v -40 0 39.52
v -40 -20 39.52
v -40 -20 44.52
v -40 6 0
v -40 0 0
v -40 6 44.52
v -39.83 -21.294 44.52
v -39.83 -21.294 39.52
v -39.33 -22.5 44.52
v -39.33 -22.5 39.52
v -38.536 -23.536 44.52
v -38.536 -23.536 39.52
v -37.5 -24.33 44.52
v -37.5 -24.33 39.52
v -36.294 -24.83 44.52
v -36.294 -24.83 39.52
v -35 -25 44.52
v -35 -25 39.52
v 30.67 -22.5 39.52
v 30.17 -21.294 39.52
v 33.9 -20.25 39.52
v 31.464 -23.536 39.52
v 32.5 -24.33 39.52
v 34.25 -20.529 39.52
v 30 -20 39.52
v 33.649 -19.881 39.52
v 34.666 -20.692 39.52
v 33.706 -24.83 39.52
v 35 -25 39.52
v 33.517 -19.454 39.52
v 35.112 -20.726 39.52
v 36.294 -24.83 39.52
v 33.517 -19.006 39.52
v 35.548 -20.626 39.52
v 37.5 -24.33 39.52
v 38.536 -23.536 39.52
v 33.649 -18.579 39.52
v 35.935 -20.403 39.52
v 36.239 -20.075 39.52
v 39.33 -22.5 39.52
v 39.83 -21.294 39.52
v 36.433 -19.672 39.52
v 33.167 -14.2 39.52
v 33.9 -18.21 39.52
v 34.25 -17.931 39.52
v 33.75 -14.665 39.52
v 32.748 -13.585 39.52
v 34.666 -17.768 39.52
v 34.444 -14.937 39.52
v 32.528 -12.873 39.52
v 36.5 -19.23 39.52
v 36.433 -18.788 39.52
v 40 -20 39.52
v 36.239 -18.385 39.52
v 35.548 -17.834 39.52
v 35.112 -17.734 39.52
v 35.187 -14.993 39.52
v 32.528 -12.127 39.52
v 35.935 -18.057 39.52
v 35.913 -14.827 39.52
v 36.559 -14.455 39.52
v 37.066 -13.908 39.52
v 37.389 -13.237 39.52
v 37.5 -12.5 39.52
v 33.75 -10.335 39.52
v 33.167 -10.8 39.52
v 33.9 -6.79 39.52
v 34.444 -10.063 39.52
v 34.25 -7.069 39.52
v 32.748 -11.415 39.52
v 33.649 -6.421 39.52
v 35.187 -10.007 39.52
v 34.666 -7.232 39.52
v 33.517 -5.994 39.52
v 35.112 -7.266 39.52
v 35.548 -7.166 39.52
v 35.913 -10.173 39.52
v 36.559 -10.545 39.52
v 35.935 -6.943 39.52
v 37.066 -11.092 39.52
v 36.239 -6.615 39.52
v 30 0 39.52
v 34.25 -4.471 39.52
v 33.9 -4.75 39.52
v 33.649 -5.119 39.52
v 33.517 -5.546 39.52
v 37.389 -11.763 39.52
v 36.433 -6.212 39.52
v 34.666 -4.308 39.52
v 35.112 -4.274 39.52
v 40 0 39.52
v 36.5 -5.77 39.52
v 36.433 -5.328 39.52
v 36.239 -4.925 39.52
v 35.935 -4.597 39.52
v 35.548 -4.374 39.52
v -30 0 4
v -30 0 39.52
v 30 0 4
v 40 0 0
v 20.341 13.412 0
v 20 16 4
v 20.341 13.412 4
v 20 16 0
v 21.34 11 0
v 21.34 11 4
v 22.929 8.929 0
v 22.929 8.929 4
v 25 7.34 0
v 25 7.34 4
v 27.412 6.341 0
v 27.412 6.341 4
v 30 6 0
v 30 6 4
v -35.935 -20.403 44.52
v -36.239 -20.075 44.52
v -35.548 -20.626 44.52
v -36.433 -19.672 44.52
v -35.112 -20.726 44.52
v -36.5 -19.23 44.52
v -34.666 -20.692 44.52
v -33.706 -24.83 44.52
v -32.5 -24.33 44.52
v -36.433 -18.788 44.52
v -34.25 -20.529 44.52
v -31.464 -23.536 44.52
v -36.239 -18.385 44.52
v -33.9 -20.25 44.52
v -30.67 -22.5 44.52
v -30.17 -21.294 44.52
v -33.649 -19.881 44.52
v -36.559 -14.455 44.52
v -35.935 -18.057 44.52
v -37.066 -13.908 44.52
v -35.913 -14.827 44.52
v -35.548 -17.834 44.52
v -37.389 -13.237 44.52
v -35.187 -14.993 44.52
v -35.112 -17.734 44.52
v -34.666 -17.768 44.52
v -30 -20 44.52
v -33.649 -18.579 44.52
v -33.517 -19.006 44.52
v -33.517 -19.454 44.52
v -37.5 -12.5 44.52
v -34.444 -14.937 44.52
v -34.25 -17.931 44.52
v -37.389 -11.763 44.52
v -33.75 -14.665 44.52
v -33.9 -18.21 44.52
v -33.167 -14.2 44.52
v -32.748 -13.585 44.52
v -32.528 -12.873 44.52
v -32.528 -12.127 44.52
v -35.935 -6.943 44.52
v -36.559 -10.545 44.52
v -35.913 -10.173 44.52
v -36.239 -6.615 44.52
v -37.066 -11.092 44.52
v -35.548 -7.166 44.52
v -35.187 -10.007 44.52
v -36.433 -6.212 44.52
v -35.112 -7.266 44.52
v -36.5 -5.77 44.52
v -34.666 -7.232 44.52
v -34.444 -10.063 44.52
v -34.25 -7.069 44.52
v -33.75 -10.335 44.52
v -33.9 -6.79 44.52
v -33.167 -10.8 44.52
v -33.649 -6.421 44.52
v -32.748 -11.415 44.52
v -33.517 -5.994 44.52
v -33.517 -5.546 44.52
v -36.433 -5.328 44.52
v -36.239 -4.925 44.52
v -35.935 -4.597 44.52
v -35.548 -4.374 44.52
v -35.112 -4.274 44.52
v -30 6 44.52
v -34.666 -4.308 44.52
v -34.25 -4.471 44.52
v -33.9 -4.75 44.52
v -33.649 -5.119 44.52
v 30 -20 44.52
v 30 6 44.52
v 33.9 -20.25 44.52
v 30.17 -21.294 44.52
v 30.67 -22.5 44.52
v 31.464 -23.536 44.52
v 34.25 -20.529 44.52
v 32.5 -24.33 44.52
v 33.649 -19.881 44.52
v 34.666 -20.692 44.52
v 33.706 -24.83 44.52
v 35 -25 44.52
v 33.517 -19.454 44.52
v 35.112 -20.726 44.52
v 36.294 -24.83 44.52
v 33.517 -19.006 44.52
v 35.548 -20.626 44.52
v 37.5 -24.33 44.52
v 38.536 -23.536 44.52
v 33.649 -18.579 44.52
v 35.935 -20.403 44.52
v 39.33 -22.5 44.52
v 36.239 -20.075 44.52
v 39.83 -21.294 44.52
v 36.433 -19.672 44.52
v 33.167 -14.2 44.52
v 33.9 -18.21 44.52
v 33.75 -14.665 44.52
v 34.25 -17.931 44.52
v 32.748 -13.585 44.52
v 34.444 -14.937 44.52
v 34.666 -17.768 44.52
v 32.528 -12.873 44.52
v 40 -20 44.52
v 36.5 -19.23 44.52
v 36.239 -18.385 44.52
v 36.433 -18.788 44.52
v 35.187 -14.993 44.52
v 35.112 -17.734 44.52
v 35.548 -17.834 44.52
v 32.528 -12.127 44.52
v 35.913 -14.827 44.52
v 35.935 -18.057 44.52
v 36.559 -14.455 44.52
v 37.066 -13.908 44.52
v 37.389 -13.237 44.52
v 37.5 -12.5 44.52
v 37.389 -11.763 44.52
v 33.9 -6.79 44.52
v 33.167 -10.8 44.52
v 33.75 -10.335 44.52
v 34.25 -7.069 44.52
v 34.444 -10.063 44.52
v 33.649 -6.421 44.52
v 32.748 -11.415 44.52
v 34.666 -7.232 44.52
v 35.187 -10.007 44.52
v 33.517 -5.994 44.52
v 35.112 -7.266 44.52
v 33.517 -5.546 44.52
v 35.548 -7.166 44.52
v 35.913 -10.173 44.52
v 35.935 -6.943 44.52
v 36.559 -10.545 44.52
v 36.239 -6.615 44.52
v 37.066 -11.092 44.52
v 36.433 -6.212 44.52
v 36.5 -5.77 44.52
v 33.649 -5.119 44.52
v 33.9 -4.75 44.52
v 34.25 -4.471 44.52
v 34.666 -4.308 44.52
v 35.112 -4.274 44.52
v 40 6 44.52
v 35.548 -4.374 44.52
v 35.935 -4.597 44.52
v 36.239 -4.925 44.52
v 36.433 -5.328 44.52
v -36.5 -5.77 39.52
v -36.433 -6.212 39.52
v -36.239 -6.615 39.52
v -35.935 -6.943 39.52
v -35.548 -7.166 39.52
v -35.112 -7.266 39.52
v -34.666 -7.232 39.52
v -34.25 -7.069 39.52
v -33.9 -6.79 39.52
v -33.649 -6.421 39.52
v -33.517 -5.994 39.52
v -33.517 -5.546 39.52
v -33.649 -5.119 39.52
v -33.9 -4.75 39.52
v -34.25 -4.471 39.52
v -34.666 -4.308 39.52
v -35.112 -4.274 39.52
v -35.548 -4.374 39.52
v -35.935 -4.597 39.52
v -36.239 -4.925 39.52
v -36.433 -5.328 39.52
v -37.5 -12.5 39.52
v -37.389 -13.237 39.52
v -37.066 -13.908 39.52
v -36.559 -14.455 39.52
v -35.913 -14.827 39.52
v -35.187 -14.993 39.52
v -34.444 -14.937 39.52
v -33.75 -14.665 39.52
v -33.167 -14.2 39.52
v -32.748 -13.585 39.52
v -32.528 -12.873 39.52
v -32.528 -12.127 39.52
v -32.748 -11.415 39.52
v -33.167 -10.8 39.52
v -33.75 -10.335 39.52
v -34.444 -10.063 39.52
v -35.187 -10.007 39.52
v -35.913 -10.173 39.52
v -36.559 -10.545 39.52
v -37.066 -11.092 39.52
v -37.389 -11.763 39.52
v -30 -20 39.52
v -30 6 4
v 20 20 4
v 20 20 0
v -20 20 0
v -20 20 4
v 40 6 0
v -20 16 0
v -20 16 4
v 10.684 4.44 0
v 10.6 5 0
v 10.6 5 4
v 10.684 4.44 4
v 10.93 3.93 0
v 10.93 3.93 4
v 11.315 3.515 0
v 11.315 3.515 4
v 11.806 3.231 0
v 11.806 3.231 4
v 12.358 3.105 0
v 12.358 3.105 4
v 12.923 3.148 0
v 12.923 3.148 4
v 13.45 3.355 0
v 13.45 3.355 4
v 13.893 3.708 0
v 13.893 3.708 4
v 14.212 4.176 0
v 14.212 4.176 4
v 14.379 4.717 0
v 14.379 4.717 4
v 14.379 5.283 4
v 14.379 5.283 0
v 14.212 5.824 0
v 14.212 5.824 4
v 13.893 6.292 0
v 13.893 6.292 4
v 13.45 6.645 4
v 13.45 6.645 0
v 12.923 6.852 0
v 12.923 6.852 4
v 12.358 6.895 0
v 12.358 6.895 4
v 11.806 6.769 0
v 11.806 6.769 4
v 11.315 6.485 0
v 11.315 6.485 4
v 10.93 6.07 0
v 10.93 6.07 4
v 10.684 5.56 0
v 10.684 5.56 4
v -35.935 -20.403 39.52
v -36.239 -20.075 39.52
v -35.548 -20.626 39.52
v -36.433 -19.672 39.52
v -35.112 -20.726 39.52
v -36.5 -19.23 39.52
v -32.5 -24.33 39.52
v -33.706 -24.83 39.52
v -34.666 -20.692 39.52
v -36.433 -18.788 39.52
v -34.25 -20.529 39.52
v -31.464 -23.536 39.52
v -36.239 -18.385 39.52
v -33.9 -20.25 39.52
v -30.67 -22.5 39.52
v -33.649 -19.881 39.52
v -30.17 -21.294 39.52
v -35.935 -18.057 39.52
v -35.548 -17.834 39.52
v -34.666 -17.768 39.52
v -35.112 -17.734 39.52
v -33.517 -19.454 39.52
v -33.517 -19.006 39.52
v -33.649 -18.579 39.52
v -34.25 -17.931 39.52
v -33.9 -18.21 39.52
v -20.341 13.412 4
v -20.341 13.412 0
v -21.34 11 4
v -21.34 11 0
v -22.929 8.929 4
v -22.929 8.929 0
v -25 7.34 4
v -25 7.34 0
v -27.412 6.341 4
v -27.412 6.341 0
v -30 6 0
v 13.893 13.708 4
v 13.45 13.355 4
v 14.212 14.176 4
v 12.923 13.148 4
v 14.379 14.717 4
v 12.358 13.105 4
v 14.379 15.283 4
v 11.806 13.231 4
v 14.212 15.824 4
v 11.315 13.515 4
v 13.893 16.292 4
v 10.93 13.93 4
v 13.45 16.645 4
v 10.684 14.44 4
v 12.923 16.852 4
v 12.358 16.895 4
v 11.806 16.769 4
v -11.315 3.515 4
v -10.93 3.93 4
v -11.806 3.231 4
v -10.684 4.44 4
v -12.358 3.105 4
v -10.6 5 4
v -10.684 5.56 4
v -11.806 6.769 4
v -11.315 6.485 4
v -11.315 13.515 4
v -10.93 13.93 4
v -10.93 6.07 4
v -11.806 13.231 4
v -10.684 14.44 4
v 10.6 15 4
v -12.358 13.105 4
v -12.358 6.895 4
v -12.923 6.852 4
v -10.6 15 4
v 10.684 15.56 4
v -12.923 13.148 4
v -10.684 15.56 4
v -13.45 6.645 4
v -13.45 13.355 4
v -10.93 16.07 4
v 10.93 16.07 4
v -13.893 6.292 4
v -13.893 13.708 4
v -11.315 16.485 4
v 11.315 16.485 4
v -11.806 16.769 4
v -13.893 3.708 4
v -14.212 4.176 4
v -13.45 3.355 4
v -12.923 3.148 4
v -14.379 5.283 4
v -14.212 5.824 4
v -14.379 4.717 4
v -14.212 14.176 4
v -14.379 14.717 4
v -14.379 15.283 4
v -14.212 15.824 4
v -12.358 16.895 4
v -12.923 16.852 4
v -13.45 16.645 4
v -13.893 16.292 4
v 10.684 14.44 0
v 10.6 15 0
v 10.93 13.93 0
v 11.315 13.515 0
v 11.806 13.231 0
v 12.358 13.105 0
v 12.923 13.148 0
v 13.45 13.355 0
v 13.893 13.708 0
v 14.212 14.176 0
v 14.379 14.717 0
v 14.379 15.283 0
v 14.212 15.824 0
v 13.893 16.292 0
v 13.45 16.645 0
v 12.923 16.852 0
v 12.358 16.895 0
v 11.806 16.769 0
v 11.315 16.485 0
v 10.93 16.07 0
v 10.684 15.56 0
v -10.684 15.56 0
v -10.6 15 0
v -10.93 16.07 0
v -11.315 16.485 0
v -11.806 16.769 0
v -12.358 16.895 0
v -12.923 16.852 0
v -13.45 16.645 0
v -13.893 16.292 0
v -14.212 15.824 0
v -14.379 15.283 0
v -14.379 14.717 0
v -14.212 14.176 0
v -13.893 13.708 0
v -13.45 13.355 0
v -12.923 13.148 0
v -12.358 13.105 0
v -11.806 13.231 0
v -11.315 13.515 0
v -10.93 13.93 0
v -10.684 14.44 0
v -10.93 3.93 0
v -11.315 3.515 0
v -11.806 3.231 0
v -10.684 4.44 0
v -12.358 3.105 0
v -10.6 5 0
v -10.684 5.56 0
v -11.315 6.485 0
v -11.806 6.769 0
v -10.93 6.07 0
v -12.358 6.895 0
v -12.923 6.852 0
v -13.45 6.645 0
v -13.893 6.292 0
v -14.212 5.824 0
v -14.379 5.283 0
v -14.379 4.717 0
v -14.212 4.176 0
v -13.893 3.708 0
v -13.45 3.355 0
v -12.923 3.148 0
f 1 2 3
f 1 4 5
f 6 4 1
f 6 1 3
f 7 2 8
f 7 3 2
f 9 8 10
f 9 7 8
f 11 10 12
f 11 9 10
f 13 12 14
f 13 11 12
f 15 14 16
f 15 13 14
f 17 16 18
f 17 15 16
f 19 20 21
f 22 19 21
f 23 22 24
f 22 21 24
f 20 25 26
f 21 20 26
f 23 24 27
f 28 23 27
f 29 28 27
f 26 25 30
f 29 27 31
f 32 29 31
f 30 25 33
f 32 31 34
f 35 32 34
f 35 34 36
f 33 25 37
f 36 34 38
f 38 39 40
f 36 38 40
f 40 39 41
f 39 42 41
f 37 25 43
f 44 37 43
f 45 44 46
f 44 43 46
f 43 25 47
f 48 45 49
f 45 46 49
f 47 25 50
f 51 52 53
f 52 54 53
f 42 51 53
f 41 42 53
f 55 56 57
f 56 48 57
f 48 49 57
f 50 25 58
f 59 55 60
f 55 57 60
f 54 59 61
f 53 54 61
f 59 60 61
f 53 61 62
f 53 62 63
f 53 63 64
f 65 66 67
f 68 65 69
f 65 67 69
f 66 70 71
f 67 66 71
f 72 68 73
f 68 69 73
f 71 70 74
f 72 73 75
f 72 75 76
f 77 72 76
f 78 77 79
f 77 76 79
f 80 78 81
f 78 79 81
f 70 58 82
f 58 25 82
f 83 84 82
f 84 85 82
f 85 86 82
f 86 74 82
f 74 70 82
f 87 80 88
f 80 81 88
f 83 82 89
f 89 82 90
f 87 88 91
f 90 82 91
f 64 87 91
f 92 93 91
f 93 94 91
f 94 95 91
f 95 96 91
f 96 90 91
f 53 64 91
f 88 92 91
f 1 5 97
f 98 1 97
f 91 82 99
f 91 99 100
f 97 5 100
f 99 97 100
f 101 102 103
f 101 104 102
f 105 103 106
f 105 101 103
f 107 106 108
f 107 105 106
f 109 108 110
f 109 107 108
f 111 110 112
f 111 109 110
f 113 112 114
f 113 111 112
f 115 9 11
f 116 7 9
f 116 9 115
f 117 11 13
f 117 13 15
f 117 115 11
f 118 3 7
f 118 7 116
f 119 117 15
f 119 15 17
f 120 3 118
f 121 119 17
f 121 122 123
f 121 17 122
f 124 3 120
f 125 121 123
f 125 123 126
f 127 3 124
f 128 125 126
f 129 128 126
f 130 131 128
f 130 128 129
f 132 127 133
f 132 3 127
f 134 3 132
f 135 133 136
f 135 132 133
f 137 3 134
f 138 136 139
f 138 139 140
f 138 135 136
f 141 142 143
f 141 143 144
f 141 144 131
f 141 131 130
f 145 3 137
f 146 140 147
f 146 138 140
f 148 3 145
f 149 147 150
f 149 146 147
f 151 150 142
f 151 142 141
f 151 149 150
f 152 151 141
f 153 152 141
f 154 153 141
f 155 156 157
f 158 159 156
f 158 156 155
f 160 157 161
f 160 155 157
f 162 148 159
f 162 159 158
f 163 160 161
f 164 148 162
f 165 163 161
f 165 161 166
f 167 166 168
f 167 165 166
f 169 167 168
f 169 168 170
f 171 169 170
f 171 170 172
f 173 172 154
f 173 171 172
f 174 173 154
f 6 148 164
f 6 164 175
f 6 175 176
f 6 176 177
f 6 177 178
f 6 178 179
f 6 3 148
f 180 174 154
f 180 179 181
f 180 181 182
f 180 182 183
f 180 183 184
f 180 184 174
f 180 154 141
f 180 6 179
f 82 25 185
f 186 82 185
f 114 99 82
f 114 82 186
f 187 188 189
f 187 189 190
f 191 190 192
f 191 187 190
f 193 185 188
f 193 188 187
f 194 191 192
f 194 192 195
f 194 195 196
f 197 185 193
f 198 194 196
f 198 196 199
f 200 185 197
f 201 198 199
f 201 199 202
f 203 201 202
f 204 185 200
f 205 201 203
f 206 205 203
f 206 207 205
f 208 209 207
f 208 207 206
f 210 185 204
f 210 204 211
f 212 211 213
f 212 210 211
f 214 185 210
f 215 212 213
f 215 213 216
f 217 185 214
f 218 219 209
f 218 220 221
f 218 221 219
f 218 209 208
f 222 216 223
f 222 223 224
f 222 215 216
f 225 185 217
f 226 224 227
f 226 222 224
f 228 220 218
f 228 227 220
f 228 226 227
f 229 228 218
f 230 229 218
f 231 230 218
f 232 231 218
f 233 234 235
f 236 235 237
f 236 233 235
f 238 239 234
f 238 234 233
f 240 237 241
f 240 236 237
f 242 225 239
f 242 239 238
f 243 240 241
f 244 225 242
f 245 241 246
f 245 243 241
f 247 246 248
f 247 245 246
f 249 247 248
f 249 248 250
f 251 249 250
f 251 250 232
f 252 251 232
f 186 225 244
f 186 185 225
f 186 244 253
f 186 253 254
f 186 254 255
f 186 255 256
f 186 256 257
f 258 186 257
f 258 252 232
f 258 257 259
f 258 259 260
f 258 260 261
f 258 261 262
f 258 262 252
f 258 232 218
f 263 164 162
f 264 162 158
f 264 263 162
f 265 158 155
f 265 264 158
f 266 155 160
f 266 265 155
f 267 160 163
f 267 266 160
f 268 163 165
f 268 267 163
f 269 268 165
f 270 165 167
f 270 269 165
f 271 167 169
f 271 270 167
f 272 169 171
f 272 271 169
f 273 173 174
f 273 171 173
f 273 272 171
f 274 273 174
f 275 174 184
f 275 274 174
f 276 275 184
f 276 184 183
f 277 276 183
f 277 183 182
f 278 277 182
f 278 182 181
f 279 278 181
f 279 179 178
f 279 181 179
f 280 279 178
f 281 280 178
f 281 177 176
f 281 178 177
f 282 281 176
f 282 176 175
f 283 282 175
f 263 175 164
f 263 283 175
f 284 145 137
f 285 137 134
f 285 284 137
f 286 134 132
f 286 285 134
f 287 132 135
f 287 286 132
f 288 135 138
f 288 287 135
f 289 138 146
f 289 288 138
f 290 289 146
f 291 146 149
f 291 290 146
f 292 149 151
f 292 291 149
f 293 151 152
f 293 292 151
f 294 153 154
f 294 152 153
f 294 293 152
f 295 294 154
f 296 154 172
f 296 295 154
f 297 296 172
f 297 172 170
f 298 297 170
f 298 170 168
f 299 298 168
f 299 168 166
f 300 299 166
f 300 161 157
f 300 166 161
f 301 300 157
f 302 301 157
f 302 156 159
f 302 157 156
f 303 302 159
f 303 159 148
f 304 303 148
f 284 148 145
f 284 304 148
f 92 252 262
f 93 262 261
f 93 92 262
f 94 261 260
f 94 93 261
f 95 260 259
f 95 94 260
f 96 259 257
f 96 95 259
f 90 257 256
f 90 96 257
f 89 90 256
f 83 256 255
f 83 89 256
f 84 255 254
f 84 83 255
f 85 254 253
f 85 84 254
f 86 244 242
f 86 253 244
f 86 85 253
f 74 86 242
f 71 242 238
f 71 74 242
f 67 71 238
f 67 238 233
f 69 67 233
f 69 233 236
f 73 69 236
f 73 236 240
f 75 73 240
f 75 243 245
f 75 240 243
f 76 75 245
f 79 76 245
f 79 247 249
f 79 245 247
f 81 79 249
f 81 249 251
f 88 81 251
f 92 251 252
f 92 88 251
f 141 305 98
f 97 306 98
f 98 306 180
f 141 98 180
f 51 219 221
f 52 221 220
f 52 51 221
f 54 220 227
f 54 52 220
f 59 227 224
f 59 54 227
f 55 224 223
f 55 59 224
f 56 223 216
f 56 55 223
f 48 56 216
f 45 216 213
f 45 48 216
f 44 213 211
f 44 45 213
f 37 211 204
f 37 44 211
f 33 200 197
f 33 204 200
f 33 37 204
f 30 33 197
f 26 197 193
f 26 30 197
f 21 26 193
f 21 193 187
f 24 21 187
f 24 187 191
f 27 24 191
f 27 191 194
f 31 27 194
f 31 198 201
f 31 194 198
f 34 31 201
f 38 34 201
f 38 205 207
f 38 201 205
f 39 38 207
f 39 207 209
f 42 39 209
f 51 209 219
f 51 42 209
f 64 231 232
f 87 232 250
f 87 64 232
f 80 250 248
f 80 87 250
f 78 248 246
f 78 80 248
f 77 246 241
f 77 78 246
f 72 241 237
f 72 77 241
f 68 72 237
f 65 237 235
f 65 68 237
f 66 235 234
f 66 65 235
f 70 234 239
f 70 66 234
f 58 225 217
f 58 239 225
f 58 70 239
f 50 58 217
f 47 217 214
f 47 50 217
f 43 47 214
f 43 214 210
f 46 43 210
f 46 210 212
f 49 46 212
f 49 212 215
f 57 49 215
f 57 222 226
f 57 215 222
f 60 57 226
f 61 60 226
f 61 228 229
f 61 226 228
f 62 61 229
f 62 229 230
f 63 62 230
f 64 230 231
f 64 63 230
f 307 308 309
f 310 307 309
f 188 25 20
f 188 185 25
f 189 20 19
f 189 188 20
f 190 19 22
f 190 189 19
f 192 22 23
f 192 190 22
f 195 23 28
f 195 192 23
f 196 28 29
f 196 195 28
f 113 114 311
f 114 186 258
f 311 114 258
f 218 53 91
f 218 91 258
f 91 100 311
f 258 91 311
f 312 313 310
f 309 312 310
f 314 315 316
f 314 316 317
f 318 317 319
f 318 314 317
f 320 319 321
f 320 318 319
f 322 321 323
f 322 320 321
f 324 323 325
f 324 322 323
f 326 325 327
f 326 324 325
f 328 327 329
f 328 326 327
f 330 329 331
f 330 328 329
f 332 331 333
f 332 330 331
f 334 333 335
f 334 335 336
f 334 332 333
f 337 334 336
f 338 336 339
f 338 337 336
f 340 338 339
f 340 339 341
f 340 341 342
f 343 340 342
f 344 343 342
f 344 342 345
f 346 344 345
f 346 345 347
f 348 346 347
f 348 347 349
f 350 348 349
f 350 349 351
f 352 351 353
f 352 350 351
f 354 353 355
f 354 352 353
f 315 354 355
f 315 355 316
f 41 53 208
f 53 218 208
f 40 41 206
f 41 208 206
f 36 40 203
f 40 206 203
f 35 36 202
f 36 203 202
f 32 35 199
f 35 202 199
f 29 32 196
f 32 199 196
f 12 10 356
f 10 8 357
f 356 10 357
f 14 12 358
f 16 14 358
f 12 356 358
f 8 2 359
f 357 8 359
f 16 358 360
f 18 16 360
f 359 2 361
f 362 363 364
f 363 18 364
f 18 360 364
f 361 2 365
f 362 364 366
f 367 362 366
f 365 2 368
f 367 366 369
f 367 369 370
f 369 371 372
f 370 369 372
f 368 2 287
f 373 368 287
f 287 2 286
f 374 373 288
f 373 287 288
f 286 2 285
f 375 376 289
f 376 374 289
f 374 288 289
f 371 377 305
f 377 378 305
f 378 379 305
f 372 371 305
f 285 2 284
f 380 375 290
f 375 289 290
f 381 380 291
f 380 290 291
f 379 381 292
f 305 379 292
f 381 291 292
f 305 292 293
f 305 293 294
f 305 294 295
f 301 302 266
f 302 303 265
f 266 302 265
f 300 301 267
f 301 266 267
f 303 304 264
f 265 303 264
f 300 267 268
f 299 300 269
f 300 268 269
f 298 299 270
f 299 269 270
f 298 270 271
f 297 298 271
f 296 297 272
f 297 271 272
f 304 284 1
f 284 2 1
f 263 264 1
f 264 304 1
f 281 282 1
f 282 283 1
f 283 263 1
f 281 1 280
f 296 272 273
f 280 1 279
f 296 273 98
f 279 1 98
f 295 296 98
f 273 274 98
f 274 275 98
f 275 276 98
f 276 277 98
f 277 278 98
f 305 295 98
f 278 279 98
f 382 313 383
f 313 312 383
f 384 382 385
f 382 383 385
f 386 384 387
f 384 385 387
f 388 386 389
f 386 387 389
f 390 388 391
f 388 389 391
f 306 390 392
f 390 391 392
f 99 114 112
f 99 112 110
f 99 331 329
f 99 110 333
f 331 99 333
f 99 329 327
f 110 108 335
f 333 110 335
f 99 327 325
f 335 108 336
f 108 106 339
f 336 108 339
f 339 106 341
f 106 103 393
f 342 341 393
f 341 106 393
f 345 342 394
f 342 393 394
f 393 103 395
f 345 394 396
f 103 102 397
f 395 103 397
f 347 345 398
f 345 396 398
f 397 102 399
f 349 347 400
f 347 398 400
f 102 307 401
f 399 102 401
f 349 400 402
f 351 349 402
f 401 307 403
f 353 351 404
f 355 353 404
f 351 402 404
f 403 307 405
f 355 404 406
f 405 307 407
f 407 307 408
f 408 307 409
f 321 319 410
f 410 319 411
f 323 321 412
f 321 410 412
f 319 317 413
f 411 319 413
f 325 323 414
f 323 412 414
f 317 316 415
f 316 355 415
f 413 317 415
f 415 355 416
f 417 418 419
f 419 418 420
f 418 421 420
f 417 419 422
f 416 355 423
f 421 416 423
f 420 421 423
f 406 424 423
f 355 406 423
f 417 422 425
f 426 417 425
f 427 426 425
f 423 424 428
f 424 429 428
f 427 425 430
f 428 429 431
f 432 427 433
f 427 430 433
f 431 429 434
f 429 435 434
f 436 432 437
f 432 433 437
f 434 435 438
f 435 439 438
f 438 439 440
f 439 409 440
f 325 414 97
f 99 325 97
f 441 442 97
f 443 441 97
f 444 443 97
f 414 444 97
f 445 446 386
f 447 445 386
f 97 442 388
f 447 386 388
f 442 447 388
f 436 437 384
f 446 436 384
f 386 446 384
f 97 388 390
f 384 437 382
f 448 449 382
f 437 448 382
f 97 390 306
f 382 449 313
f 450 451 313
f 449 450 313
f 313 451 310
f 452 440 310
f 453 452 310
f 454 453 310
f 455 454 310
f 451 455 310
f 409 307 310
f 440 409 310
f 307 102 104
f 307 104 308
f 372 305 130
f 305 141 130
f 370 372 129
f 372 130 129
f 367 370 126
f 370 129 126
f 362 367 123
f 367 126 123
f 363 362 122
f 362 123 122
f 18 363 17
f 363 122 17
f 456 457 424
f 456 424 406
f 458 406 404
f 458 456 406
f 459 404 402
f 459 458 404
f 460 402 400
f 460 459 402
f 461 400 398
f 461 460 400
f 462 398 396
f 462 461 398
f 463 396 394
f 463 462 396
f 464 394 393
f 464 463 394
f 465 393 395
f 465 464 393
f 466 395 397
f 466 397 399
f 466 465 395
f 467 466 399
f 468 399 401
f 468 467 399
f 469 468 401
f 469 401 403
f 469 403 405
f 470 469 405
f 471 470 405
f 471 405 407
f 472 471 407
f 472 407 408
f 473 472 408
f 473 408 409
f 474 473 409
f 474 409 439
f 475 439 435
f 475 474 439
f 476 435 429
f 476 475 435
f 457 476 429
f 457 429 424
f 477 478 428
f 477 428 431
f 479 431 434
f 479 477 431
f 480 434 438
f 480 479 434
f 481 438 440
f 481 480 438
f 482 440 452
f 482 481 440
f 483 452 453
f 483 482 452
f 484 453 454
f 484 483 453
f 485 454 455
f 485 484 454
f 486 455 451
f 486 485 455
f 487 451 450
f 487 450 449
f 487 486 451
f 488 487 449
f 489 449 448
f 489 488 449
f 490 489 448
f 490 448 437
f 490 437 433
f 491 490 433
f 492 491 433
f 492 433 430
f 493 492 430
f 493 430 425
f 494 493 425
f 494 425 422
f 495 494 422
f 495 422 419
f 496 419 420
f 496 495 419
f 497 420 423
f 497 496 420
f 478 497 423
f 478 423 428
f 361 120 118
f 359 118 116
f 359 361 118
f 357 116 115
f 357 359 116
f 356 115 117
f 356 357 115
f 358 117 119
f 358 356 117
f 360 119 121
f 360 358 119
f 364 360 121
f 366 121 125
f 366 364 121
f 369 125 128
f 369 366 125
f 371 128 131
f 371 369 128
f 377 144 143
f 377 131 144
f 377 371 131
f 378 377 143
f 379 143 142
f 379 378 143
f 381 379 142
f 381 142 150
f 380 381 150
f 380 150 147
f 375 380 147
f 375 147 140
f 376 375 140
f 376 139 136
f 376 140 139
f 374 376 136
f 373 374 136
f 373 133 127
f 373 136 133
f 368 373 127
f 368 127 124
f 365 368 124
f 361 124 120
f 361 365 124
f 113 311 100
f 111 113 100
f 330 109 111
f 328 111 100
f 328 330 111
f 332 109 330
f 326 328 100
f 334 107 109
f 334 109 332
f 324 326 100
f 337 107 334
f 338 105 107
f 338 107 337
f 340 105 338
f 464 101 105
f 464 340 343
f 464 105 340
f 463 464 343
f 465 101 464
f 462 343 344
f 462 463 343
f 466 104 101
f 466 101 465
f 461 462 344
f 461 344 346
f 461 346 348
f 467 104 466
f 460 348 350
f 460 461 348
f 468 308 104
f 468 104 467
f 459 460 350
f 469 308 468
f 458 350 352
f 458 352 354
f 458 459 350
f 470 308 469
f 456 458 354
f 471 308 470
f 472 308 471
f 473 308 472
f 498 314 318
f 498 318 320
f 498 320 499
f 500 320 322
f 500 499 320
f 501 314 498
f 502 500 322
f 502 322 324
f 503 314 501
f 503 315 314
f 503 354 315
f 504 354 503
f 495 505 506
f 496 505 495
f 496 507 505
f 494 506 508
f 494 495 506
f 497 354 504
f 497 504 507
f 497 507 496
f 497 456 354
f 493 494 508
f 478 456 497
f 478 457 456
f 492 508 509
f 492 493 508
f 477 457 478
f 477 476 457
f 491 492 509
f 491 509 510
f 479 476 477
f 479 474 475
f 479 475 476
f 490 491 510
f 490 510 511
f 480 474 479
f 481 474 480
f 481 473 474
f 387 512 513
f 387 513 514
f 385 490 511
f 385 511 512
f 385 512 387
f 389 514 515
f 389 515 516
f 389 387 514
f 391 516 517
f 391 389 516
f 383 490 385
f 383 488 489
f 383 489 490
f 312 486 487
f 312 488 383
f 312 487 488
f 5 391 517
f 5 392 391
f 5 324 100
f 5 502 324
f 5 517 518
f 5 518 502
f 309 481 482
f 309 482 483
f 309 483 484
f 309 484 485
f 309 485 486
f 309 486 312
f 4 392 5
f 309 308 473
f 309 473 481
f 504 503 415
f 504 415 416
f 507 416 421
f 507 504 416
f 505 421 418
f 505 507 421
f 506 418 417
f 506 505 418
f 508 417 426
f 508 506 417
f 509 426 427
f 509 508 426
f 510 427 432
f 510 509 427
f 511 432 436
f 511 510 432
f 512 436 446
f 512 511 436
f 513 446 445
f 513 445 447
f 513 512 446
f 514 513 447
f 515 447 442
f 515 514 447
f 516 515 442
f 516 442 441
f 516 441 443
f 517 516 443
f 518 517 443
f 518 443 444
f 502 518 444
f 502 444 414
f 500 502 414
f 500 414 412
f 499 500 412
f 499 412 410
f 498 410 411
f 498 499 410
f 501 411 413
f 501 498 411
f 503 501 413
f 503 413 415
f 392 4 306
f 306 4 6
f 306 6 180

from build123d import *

# Parameters (mm, degrees)
SKETCH1_W           = 40
SKETCH1_H           = 20
SKETCH1_R           = 1.9
MAIN_MOUNTING_DEPTH = 4
SKETCH2_W           = 20
SKETCH2_H           = 20
EXTENTION_DEPTH     = 4
SKETCH3_W           = 10
SKETCH3_H           = 6
BOSS_EXTRUDE3_DEPTH = 40.52
SKETCH4_W           = 10
SKETCH4_H           = 5
BOSS_EXTRUDE4_DEPTH = 25
SKETCH5_R           = 1.5
SKETCH5_R_2         = 2.5
CUT_EXTRUDE1_DEPTH  = 62.537227757
SKETCH7_W           = 20
SKETCH7_H           = 14
CUT_EXTRUDE2_DEPTH  = 63.184165187
FILLET1_R           = 10
FILLET2_R           = 5


with BuildPart() as part:
    # Sketch1 → main mounting (new body)
    with BuildSketch(Plane.XY):
        with Locations((0, 10)):
            Rectangle(SKETCH1_W, SKETCH1_H)
        with Locations((-12.5, 15)):
            Circle(SKETCH1_R, mode=Mode.SUBTRACT)
        with Locations((-12.5, 5)):
            Circle(SKETCH1_R, mode=Mode.SUBTRACT)
        with Locations(Location((12.5, 5, 0), (0, 0, 180))):
            Circle(SKETCH1_R, mode=Mode.SUBTRACT)
        with Locations(Location((12.5, 15, 0), (0, 0, 180))):
            Circle(SKETCH1_R, mode=Mode.SUBTRACT)
    extrude(amount=MAIN_MOUNTING_DEPTH)

    # Sketch2 → extention (add)
    with BuildSketch(Plane(origin=(0, 0, 0), x_dir=(-1, 0, 0), z_dir=(0, 0, -1))):
        with Locations((30, 10)):
            Rectangle(SKETCH2_W, SKETCH2_H)
        with Locations((-30, 10)):
            Rectangle(SKETCH2_W, SKETCH2_H)
    extrude(amount=-EXTENTION_DEPTH)

    # Sketch3 → Boss-Extrude3 (add)
    with BuildSketch(Plane.XY.offset(4)):
        with Locations((-35, 3)):
            Rectangle(SKETCH3_W, SKETCH3_H)
        with Locations((35, 3)):
            Rectangle(SKETCH3_W, SKETCH3_H)
    extrude(amount=BOSS_EXTRUDE3_DEPTH)

    # Sketch4 → Boss-Extrude4 (add)
    with BuildSketch(Plane.XZ):
        with Locations((-35, 42.02)):
            Rectangle(SKETCH4_W, SKETCH4_H)
        with Locations((35, 42.02)):
            Rectangle(SKETCH4_W, SKETCH4_H)
    extrude(amount=BOSS_EXTRUDE4_DEPTH)

    # Sketch5 → Cut-Extrude1 (cut, through all)
    with BuildSketch(Plane(origin=(0, 0, 39.52), x_dir=(-1, 0, 0), z_dir=(0, 0, 1))):
        with Locations((35, 19.23)):
            Circle(SKETCH5_R)
        with Locations((35, 5.77)):
            Circle(SKETCH5_R)
        with Locations(Location((-35, 12.5, 0), (0, 0, 180))):
            Circle(SKETCH5_R_2)
        with Locations((35, 12.5)):
            Circle(SKETCH5_R_2)
        with Locations(Location((-35, 5.77, 0), (0, 0, 180))):
            Circle(SKETCH5_R)
        with Locations(Location((-35, 19.23, 0), (0, 0, 180))):
            Circle(SKETCH5_R)
    extrude(amount=CUT_EXTRUDE1_DEPTH, mode=Mode.SUBTRACT)

    # Sketch7 → Cut-Extrude2 (cut, through all)
    with BuildSketch(Plane.XY.offset(4)):
        with Locations((-30, 13)):
            Rectangle(SKETCH7_W, SKETCH7_H)
        with Locations((30, 13)):
            Rectangle(SKETCH7_W, SKETCH7_H)
    extrude(amount=-CUT_EXTRUDE2_DEPTH, mode=Mode.SUBTRACT)

    # Fillet1
    fillet1_edges = [part.edges().sort_by_distance(p)[0] for p in [
        (20, 6, 2),
        (-20, 6, 2),
    ]]
    fillet(fillet1_edges, radius=FILLET1_R)

    # Fillet2
    fillet2_edges = [part.edges().sort_by_distance(p)[0] for p in [
        (40, -25, 42.02),
        (30, -25, 42.02),
        (-40, -25, 42.02),
        (-30, -25, 42.02),
    ]]
    fillet(fillet2_edges, radius=FILLET2_R - 0.0001)  # a hair under: the kernel refuses the full size


solid = part.part
